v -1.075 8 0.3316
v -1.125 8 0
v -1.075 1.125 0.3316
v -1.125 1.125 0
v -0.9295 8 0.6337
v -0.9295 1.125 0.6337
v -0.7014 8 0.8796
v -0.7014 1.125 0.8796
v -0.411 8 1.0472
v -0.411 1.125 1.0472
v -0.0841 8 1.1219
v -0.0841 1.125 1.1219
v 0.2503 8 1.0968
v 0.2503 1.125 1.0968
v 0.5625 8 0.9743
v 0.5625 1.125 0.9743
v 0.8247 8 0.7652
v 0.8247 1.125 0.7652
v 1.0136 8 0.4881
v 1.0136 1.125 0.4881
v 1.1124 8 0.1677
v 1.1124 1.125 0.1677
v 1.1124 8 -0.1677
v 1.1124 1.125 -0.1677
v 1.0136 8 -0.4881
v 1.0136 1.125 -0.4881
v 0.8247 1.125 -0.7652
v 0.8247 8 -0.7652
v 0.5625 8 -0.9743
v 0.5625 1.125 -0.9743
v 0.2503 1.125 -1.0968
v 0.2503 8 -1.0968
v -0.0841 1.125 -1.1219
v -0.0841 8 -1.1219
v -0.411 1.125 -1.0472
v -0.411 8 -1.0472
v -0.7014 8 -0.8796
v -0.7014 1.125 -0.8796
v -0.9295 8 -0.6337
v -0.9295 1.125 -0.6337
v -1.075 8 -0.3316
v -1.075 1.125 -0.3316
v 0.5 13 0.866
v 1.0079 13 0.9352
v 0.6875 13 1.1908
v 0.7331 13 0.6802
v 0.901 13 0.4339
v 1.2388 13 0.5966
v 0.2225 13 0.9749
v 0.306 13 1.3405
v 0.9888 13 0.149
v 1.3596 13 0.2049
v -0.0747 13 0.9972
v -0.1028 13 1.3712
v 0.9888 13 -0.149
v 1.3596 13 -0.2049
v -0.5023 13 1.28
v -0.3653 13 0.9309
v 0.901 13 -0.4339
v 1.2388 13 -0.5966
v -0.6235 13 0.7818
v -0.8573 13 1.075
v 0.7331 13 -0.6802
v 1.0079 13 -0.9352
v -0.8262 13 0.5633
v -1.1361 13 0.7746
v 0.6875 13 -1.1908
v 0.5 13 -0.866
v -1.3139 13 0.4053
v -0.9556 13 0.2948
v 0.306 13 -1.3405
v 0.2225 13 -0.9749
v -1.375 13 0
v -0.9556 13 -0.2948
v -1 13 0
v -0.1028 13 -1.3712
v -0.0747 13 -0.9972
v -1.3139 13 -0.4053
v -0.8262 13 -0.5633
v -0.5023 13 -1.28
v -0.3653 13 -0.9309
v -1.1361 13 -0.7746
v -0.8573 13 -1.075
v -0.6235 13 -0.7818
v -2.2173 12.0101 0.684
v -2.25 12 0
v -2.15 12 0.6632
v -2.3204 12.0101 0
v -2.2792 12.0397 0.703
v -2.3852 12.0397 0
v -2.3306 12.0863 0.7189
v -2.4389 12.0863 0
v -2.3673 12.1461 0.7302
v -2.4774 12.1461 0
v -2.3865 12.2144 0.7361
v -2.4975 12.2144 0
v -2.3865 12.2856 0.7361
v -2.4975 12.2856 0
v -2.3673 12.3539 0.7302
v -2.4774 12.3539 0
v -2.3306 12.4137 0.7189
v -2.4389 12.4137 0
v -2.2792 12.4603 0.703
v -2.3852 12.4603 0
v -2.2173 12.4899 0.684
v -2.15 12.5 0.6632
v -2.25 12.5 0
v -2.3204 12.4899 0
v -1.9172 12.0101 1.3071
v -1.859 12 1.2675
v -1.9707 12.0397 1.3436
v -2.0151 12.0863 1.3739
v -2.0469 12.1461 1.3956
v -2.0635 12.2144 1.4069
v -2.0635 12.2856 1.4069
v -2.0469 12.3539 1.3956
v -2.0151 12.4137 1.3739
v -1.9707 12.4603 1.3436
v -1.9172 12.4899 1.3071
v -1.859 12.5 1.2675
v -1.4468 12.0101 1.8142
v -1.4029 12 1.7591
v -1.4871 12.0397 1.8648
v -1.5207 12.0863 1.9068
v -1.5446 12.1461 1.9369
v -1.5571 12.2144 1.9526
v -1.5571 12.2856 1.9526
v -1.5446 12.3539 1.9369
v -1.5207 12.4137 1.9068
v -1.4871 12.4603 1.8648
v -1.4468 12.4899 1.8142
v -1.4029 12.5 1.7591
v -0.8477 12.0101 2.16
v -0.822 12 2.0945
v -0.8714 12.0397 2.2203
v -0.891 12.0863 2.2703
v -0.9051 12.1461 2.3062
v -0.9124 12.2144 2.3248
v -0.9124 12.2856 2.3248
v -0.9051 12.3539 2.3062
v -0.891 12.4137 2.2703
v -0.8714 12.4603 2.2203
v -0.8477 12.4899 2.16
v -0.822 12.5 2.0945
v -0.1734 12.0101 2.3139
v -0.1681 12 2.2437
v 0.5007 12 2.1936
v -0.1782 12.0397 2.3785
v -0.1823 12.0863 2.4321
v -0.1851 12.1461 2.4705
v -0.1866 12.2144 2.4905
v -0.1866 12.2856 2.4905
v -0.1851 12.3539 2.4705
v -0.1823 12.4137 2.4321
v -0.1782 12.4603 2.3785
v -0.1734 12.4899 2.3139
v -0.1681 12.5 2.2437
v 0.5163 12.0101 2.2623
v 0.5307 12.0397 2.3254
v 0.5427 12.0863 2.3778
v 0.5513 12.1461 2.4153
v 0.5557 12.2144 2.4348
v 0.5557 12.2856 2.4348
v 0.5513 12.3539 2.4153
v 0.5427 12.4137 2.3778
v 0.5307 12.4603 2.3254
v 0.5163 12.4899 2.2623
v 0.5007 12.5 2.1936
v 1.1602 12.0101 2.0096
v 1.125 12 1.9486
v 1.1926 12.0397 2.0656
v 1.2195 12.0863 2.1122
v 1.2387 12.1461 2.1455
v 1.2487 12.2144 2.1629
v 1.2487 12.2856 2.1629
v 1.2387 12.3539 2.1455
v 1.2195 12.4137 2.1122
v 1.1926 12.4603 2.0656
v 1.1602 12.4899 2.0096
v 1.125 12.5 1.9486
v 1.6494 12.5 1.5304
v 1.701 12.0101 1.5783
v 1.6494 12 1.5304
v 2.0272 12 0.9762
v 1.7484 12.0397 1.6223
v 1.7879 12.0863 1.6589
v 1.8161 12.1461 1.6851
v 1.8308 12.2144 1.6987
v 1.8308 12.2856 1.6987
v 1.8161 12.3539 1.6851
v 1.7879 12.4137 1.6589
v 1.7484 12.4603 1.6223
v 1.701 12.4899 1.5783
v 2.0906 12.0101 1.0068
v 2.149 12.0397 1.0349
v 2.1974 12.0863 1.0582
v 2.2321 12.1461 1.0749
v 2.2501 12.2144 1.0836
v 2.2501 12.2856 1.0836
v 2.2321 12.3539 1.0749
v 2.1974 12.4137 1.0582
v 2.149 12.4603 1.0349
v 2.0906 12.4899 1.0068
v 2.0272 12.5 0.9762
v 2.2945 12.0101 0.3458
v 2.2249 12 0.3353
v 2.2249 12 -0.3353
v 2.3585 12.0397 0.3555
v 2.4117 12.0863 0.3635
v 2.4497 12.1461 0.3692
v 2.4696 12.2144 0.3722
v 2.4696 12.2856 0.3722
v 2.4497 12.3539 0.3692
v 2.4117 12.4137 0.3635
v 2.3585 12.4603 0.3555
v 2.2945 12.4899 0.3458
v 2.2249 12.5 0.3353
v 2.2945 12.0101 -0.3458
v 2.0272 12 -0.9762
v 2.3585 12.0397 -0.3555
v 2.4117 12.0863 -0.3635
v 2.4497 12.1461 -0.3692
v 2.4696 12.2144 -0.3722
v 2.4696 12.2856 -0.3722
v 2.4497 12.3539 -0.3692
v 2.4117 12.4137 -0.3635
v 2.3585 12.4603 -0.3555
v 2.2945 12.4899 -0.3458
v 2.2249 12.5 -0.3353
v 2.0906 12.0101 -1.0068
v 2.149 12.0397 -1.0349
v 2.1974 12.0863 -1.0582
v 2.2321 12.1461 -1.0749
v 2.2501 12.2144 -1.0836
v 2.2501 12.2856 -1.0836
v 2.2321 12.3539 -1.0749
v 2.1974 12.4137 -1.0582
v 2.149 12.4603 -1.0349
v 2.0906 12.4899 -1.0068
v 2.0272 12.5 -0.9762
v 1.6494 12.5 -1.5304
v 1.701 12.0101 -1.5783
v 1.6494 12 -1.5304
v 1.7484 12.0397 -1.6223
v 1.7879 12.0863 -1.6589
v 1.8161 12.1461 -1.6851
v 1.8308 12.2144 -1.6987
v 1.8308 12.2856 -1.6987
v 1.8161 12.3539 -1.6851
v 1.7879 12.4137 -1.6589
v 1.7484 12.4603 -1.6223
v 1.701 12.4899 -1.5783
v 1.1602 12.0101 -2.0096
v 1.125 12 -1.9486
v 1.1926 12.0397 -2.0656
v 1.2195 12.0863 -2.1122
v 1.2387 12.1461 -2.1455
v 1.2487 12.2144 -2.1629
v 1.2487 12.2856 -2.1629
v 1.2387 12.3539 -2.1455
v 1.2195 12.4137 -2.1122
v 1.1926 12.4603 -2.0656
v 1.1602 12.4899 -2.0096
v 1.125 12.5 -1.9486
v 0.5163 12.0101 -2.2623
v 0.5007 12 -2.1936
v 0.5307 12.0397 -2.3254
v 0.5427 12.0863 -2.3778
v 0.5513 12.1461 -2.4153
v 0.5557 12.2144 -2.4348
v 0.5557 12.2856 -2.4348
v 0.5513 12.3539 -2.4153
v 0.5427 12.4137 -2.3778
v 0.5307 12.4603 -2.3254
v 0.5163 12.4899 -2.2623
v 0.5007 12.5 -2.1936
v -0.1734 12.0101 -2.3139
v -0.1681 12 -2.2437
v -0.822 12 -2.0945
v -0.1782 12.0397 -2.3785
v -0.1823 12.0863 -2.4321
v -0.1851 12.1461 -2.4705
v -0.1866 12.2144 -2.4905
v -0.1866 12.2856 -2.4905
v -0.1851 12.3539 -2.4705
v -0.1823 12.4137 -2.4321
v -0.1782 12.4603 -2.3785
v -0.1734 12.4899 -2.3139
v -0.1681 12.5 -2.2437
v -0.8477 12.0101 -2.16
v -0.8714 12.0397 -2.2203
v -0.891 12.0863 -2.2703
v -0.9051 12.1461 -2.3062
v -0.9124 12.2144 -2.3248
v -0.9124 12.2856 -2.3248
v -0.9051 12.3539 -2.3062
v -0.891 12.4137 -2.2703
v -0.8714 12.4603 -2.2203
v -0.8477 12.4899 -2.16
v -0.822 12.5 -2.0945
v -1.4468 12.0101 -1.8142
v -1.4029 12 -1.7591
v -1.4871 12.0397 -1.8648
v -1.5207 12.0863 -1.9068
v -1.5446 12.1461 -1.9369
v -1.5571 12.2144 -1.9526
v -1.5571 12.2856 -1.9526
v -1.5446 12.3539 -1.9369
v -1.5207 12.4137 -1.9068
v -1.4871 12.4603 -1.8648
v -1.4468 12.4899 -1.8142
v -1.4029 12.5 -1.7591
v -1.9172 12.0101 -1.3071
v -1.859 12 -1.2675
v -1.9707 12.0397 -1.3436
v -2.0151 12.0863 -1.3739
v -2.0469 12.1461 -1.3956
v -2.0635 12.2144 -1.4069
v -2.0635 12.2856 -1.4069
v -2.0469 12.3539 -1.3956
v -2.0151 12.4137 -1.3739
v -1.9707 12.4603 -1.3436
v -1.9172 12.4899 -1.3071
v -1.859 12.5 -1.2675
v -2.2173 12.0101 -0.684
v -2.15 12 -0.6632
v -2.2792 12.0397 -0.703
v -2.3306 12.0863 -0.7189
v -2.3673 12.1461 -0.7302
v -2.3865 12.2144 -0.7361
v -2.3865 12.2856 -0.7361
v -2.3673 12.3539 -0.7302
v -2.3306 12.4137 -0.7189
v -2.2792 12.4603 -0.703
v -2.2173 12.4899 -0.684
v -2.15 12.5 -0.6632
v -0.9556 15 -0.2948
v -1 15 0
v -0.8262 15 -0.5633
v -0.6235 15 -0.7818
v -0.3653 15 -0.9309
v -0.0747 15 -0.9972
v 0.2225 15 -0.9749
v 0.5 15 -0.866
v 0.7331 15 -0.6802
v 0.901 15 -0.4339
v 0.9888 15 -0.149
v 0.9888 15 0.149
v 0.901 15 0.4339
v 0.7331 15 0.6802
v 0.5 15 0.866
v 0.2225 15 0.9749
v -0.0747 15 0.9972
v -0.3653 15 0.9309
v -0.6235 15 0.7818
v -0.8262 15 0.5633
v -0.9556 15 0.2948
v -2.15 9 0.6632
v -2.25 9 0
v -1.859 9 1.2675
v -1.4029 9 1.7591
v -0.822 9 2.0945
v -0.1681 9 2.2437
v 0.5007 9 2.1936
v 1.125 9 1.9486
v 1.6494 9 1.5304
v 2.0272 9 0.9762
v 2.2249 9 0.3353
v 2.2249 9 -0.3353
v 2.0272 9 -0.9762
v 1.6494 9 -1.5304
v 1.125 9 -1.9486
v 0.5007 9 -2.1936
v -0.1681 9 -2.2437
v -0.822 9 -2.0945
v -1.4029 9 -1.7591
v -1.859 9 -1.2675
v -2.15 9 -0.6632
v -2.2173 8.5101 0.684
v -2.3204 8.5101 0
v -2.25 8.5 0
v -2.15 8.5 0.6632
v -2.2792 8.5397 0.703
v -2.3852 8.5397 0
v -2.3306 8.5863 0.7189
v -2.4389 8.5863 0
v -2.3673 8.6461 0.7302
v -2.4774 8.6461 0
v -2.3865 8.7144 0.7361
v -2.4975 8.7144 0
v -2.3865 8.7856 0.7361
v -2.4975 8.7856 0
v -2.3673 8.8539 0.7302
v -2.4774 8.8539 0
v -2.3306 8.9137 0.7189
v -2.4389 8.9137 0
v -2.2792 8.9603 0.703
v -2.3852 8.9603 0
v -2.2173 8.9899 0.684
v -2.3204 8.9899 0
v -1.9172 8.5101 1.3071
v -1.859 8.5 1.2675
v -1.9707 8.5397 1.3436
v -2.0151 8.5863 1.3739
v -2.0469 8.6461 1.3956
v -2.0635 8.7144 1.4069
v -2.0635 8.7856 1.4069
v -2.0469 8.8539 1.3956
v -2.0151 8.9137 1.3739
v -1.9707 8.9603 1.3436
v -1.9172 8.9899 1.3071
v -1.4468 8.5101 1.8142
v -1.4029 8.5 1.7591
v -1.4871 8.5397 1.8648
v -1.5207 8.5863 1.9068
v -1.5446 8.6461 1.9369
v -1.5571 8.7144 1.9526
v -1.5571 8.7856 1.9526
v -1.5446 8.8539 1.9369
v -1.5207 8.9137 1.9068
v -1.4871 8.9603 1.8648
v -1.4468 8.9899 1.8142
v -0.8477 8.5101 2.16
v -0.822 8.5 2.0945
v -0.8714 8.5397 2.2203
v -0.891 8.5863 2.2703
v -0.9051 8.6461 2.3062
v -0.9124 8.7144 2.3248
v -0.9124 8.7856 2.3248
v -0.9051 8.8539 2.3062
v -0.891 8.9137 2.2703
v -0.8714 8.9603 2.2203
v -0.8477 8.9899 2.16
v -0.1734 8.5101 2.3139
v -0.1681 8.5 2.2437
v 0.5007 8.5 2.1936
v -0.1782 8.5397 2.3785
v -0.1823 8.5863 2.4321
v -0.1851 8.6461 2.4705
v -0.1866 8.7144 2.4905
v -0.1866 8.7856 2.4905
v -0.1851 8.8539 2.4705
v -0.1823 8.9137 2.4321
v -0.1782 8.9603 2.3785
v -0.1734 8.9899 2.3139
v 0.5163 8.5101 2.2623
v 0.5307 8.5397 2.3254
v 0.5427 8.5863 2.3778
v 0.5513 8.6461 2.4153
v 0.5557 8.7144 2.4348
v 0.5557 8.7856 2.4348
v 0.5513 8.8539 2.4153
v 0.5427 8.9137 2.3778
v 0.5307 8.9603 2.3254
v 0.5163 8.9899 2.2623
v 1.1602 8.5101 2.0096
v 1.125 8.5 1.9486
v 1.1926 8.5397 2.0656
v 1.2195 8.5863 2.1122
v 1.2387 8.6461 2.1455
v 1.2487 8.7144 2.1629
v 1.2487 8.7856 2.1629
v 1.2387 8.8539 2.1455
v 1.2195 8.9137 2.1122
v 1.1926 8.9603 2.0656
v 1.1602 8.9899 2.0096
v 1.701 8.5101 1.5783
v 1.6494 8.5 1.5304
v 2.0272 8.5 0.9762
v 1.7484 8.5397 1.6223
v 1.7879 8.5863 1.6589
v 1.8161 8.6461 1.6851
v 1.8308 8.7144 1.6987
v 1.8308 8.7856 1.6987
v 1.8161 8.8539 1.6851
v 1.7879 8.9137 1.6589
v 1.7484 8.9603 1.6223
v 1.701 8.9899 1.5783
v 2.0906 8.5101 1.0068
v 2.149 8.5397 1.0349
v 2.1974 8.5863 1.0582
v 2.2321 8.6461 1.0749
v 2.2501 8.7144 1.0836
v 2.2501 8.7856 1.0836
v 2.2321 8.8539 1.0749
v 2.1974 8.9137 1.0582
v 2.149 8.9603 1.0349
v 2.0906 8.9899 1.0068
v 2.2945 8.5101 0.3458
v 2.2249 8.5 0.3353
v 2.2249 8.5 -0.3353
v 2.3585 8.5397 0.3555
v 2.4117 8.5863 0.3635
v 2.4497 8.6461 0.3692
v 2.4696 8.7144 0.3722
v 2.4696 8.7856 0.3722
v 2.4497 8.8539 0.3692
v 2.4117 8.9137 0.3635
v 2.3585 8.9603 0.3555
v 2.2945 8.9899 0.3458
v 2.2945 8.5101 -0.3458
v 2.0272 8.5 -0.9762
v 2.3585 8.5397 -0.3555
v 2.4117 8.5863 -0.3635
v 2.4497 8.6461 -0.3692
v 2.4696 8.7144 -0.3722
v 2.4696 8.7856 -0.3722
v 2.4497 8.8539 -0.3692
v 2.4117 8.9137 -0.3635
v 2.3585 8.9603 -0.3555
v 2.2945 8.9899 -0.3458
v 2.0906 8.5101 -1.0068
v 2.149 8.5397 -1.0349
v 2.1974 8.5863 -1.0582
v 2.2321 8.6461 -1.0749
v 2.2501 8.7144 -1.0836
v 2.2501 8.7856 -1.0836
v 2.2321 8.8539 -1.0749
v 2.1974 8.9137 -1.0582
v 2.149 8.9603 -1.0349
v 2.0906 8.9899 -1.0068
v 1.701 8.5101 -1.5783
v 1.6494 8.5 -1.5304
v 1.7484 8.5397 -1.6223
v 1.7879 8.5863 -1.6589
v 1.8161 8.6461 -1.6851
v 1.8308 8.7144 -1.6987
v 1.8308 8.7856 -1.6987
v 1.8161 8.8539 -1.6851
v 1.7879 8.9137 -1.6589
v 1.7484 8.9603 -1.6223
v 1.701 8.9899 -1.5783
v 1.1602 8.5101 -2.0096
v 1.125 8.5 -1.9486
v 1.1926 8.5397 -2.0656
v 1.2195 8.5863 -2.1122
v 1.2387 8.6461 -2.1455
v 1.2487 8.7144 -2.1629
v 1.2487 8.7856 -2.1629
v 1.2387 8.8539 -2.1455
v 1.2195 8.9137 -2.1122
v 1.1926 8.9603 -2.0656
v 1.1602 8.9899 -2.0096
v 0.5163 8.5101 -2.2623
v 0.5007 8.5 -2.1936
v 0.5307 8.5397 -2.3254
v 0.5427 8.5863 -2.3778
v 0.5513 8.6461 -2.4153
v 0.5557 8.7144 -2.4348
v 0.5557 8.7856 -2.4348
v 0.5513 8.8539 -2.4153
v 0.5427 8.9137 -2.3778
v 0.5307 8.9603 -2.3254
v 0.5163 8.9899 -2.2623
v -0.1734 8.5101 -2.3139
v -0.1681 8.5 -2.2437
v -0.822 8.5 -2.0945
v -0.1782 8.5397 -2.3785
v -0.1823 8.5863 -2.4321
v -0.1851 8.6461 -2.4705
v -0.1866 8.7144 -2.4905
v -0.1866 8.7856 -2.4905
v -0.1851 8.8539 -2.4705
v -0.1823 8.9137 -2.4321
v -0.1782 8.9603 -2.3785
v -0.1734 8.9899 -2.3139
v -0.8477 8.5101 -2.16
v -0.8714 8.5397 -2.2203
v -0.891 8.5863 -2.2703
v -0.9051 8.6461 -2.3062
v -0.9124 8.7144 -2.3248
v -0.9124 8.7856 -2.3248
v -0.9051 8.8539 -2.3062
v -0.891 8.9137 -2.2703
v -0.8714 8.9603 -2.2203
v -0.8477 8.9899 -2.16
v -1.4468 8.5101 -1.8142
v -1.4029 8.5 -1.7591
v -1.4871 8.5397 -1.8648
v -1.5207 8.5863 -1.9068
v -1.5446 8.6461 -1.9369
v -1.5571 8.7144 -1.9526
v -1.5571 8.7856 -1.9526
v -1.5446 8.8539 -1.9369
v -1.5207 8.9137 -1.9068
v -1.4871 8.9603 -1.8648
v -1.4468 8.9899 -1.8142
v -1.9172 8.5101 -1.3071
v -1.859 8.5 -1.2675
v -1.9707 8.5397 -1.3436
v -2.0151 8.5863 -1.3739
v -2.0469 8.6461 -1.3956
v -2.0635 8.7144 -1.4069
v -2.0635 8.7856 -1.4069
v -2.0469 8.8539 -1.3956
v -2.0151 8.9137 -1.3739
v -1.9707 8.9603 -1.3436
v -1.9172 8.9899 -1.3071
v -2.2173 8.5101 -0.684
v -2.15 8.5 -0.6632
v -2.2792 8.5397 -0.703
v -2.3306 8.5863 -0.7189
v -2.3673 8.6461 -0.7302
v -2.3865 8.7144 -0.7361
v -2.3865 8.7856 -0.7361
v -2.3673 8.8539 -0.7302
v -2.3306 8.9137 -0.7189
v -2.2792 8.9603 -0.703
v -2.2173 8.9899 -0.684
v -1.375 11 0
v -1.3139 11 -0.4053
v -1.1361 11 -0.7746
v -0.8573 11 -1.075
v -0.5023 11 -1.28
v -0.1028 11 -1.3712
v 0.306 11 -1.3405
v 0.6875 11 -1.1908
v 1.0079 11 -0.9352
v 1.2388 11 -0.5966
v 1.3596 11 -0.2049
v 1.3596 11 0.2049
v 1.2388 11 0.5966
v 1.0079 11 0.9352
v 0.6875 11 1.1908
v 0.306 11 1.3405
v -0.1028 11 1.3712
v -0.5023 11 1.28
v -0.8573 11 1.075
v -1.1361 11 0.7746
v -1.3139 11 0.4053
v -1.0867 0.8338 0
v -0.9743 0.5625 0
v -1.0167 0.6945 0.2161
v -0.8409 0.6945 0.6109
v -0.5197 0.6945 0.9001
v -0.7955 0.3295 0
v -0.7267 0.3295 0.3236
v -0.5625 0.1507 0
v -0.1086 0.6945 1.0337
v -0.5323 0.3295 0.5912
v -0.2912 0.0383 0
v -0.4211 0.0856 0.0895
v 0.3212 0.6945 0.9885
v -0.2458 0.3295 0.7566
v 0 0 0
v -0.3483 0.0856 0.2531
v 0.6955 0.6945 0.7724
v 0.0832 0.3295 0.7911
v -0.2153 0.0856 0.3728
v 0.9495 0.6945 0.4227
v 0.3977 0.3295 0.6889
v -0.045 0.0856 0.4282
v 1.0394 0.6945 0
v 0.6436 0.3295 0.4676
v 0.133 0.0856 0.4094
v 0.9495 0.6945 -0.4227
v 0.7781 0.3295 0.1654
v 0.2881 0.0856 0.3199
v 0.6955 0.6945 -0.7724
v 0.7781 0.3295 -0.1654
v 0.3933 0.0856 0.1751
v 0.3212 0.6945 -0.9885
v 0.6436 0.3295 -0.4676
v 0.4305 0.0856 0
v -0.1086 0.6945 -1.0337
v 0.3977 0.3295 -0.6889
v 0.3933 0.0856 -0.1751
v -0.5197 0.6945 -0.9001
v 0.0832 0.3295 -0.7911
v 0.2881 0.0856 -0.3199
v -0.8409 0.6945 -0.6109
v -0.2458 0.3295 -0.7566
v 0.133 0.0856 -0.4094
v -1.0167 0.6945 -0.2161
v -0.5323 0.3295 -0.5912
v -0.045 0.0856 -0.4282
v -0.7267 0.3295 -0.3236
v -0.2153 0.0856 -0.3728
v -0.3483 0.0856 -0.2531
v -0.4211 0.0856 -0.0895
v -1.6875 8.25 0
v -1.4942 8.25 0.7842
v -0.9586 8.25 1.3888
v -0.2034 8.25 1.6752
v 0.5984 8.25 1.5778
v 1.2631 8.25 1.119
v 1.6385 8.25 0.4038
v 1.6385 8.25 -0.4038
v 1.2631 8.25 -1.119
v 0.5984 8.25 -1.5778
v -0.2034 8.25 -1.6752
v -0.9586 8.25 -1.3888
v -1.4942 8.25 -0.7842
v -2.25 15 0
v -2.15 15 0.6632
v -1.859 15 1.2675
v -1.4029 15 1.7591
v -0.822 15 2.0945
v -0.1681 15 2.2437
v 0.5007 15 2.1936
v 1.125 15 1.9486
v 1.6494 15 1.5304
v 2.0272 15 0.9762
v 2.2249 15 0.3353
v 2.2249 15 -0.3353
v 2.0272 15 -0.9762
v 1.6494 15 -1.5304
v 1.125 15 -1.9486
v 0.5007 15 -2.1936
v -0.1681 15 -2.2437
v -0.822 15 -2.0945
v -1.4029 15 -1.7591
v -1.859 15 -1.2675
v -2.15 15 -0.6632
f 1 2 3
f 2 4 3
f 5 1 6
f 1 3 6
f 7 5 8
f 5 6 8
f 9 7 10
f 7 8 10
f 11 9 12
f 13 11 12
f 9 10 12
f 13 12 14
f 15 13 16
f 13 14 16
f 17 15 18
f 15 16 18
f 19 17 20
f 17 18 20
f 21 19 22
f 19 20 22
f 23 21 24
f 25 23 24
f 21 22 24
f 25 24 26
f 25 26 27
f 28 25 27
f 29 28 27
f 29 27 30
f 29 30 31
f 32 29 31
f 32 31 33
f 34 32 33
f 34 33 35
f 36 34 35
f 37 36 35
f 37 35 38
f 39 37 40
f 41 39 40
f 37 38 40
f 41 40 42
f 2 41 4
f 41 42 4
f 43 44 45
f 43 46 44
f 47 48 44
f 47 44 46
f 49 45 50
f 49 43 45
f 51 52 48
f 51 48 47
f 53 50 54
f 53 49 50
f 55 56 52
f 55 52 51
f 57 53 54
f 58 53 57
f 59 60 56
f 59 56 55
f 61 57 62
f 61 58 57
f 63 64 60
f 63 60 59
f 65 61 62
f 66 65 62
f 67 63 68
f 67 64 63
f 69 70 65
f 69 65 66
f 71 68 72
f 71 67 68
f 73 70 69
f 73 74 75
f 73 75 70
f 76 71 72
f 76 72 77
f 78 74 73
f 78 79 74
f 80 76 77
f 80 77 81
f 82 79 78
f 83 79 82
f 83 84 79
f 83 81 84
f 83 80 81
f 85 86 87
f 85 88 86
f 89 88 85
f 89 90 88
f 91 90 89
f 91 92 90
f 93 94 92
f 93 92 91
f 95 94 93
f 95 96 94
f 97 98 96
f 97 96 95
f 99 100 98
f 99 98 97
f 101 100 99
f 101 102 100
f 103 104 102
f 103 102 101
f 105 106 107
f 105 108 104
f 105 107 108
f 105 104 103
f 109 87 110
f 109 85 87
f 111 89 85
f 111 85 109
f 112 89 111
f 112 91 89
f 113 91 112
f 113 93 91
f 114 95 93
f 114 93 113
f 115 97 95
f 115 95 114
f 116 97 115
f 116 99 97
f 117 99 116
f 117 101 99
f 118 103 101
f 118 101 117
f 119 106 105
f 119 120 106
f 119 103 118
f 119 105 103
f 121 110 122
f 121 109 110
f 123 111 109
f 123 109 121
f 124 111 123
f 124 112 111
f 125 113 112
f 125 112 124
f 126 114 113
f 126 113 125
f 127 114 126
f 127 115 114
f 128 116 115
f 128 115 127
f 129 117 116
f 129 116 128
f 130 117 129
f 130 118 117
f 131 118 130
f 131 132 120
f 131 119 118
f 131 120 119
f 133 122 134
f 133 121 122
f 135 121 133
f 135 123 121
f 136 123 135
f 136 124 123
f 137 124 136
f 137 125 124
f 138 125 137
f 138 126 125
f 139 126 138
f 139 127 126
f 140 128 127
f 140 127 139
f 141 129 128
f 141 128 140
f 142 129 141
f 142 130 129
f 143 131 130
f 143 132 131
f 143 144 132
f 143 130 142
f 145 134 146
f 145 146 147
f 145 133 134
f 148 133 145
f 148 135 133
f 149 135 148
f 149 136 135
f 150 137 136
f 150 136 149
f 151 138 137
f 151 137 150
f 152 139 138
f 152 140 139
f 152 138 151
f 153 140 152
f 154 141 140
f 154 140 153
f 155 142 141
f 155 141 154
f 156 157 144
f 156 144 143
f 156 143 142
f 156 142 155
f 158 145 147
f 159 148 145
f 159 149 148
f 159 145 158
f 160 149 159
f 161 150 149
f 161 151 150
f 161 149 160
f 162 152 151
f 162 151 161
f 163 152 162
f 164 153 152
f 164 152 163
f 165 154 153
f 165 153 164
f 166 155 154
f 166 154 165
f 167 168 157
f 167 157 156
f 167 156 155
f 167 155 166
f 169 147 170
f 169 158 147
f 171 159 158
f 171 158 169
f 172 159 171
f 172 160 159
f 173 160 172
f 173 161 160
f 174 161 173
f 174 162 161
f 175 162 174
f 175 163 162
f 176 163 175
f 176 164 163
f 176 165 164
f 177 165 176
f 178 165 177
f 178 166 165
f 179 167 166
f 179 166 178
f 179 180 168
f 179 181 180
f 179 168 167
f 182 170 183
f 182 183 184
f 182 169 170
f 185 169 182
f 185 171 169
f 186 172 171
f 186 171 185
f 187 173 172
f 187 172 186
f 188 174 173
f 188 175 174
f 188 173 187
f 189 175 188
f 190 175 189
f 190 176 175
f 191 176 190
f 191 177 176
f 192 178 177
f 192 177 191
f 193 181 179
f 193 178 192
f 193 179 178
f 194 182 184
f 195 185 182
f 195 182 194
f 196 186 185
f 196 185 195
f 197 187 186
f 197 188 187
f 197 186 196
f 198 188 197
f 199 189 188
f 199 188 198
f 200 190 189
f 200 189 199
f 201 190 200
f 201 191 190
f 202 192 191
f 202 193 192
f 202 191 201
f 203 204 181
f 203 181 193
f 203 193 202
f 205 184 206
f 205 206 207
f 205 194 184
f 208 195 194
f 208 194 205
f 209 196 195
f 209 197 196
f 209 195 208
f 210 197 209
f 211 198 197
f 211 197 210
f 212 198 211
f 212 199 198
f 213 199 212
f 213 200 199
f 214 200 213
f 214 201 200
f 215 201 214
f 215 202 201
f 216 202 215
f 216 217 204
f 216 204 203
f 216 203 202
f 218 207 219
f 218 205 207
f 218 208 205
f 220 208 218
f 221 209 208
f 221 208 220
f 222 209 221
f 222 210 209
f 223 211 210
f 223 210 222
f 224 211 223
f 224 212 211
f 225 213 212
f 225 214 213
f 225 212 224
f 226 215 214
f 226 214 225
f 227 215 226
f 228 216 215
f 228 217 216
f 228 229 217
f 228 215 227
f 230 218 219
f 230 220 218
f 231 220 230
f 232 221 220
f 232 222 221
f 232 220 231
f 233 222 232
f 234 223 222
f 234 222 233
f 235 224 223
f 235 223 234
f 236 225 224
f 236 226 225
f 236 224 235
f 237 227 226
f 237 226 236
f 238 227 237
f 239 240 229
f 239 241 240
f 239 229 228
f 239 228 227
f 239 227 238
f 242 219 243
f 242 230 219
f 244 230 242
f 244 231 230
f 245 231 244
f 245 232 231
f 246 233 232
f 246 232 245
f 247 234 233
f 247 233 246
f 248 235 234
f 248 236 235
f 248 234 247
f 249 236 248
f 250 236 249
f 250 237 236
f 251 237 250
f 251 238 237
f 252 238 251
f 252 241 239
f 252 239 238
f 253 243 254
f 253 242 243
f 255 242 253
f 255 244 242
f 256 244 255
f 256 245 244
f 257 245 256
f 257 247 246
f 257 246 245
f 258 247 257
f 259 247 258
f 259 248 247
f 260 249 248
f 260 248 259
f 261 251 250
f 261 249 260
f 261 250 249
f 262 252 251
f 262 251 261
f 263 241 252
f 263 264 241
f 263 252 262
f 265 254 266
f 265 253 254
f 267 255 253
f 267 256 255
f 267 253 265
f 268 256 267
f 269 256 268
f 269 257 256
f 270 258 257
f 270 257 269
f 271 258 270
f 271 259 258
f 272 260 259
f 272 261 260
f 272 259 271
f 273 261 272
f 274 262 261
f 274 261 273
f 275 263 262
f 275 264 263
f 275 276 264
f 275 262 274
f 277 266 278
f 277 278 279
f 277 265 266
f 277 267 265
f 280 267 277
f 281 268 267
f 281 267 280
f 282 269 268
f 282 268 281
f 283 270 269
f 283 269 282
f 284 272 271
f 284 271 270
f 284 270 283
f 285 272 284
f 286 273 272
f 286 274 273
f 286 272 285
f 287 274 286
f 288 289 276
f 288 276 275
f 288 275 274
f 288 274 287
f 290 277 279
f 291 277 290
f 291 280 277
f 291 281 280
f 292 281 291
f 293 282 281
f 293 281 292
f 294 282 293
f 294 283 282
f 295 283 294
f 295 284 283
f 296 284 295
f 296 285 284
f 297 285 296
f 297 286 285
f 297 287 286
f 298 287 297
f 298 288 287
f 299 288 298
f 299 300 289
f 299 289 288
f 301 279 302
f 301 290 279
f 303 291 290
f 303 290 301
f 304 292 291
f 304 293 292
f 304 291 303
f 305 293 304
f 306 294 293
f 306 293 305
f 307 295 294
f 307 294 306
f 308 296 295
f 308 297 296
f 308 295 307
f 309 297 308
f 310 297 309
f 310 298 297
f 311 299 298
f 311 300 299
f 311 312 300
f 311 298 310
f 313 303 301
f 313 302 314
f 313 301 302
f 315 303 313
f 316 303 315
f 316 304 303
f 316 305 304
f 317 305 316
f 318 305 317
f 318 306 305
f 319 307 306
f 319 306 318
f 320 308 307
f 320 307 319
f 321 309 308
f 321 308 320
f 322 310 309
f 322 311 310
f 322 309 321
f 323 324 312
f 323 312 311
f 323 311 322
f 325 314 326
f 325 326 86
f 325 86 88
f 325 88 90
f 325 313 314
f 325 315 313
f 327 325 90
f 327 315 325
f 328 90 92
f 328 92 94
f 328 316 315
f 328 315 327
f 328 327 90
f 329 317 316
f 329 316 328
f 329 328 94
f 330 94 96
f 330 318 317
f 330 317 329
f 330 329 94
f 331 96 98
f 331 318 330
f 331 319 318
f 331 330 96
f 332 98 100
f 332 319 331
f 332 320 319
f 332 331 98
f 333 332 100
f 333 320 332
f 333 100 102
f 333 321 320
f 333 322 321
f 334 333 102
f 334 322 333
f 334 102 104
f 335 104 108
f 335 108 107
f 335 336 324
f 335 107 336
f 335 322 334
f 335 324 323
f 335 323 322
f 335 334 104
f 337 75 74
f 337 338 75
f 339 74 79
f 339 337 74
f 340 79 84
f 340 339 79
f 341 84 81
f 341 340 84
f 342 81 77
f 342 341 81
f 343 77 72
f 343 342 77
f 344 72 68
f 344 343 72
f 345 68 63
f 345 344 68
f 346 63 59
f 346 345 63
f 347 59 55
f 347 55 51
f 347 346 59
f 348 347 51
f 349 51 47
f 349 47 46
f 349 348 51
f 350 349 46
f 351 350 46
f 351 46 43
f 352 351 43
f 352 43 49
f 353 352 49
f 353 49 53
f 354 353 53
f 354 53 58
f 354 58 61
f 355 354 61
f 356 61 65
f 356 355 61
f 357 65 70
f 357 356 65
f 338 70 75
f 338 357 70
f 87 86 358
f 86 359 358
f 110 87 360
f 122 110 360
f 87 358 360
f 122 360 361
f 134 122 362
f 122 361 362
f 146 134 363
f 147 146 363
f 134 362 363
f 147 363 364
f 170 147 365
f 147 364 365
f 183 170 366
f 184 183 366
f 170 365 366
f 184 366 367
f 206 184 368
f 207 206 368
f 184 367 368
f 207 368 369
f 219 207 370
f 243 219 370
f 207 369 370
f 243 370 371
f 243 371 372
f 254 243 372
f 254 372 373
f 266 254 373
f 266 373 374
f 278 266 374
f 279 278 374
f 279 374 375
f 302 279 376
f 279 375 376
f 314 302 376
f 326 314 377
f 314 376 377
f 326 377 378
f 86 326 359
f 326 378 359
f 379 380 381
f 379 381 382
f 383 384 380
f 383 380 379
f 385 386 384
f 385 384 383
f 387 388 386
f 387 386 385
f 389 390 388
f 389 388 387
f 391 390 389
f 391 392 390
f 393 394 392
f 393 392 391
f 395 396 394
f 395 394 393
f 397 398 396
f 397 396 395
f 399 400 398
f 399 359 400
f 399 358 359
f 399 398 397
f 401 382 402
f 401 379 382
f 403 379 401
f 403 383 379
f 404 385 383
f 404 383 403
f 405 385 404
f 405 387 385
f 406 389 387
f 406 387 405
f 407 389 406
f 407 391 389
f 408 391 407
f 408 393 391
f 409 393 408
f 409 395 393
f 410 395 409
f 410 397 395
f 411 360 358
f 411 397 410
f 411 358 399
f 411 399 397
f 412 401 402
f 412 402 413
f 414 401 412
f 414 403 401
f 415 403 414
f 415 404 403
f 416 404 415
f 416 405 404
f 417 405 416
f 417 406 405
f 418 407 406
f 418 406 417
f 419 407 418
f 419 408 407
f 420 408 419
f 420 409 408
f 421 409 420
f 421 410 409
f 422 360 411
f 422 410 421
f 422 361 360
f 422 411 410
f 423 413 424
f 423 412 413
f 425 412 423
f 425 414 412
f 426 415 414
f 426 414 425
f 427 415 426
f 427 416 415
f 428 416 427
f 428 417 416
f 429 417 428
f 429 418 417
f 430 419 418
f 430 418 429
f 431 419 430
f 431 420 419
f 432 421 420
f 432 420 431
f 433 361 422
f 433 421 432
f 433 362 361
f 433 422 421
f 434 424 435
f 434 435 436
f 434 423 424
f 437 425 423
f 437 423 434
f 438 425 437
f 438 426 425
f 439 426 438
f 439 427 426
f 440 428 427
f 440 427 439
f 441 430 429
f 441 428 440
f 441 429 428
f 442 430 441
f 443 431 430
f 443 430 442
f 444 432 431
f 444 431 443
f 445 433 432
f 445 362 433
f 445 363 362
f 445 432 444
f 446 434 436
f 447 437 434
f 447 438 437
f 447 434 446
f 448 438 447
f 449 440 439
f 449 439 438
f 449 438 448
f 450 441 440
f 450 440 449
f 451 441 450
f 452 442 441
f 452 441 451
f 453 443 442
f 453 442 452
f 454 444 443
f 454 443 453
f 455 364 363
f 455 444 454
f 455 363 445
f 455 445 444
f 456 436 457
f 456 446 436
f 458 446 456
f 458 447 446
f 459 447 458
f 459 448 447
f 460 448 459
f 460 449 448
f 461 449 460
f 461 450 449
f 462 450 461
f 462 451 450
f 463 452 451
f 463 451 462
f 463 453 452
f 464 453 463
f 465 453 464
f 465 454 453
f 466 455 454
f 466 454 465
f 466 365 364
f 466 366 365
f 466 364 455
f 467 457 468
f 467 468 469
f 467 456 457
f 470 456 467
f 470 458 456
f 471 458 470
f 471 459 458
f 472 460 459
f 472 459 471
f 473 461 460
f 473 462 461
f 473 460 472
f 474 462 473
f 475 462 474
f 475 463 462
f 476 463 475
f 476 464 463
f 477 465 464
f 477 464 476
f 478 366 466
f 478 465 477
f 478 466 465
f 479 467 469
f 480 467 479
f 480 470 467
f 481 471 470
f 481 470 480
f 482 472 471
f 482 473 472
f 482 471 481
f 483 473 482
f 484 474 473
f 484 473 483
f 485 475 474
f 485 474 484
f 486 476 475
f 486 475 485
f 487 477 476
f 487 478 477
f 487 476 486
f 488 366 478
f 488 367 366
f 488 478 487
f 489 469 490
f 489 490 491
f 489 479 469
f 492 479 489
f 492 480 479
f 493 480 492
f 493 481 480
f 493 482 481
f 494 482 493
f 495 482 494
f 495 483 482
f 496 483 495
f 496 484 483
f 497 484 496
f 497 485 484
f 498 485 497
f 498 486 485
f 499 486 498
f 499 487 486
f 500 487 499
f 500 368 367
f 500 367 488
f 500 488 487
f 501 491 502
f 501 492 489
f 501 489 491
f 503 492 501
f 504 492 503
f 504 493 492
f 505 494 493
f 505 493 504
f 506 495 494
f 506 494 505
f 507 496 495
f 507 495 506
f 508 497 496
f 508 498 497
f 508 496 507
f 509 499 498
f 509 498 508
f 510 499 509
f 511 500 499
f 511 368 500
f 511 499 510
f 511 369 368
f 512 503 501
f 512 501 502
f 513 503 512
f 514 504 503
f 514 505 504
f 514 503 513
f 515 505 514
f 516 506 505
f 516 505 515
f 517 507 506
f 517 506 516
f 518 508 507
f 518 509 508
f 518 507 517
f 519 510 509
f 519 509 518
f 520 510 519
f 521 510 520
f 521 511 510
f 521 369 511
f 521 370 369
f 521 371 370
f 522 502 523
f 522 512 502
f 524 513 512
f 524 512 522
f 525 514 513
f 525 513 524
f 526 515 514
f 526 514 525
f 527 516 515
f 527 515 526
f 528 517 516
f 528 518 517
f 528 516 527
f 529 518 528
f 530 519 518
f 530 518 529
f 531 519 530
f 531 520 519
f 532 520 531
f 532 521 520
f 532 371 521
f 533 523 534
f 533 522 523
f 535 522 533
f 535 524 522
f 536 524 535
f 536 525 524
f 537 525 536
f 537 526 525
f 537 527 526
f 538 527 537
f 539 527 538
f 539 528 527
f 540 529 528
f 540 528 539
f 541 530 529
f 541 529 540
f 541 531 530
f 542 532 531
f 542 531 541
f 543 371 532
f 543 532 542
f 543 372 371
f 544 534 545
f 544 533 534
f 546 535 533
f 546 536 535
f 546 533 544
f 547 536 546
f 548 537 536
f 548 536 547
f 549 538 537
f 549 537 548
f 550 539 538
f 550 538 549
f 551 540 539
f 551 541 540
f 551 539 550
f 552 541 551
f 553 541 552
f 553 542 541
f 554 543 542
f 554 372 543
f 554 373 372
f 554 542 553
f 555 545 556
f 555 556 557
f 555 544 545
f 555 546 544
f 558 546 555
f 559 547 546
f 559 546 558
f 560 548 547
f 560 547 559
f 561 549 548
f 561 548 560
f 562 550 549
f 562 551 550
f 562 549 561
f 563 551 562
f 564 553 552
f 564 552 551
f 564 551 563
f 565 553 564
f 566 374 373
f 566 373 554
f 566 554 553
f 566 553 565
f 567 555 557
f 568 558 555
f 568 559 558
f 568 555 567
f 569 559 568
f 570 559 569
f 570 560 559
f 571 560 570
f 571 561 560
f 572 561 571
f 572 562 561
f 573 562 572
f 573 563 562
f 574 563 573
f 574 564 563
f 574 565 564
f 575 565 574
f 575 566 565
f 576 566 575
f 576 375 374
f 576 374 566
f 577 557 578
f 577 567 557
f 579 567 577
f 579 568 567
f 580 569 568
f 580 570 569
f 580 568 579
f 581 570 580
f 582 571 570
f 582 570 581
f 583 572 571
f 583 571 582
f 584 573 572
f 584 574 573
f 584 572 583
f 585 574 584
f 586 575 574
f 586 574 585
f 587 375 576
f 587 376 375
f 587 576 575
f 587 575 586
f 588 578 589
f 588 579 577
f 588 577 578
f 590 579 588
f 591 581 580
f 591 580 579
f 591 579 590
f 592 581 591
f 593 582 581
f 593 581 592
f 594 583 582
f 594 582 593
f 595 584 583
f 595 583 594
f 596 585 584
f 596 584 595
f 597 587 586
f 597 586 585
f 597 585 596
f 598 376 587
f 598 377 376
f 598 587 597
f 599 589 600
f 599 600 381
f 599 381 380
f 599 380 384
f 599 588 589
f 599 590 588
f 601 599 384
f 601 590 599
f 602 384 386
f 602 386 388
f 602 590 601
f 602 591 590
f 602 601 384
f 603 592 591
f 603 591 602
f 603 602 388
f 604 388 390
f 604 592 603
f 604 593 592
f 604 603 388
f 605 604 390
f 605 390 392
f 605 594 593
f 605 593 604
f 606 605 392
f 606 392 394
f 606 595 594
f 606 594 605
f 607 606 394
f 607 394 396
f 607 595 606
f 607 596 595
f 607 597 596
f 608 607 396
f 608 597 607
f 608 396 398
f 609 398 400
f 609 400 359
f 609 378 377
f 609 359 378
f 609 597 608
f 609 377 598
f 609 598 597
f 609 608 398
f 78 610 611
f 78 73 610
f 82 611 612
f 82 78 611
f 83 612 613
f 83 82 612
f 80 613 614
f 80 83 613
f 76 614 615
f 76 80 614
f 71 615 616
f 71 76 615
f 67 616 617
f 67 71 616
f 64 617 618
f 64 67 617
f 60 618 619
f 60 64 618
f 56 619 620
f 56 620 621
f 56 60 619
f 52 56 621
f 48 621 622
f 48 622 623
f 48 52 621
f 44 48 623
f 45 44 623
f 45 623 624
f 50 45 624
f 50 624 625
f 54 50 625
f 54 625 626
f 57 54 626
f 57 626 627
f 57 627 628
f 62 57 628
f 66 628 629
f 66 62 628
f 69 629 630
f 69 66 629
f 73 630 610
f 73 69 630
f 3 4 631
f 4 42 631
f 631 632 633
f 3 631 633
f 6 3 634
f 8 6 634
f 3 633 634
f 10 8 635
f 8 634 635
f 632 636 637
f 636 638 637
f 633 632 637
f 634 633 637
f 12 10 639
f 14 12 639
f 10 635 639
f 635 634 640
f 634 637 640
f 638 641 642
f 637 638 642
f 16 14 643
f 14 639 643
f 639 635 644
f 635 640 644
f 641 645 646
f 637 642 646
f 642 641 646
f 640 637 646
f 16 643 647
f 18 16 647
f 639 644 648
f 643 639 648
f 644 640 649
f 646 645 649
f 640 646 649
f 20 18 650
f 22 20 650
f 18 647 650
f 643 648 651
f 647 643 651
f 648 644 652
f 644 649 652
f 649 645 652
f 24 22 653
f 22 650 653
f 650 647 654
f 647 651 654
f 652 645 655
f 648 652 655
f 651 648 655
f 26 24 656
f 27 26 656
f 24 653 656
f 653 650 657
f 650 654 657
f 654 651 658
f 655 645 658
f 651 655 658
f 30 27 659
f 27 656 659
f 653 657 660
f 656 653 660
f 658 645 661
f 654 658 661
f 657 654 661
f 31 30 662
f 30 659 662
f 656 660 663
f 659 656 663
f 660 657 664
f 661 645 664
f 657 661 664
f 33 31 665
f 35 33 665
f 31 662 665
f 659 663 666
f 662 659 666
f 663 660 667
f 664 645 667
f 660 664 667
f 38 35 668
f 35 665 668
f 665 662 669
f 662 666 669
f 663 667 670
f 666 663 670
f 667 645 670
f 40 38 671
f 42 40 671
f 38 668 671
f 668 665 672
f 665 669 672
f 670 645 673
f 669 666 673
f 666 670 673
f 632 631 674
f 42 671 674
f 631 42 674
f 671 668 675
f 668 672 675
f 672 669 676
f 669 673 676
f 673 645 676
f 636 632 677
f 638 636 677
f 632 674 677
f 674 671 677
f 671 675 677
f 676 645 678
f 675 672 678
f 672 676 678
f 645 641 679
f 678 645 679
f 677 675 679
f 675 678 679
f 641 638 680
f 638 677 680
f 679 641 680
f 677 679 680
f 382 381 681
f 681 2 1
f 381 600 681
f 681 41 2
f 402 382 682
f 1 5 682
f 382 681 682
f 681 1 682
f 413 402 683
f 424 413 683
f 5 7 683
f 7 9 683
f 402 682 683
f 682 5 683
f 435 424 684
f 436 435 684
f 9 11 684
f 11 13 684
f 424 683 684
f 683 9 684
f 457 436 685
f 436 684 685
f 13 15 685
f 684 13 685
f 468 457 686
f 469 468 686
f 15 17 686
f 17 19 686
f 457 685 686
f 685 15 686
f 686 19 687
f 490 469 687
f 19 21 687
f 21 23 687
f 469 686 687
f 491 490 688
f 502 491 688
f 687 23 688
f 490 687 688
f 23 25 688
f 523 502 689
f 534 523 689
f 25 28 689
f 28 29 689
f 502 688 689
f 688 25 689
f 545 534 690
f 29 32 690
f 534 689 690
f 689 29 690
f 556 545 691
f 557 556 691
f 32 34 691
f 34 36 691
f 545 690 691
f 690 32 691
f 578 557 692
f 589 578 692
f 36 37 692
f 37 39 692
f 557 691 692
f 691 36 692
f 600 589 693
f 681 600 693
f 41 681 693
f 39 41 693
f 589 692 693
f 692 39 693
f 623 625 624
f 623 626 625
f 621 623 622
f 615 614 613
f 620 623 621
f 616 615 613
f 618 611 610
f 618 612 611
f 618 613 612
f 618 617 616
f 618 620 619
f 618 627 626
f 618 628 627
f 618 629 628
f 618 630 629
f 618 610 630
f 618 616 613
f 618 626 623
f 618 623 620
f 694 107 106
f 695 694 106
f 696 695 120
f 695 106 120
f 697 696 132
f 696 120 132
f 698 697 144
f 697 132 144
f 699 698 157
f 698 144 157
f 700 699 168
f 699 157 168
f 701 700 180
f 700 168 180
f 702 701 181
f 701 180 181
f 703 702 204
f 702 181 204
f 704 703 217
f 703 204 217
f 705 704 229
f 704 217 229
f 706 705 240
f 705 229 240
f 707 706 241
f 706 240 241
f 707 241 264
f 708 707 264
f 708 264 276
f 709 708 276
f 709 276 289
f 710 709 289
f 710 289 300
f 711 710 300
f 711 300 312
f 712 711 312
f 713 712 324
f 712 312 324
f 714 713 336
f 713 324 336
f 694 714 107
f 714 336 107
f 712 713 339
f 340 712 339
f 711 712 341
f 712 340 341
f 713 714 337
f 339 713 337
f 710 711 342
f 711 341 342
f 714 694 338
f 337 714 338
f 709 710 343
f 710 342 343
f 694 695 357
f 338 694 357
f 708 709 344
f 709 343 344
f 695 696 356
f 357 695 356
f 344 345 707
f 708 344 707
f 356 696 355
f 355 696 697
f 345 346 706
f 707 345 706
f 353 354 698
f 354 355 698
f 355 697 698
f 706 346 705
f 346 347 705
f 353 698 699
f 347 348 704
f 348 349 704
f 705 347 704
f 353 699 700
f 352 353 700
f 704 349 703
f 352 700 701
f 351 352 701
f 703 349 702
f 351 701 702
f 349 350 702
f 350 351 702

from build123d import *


with BuildPart() as part:
    # Skizze1 → Rotation1 (revolve)
    with BuildSketch(Plane.XY):
        with BuildLine():
            Line((-2.25, 15), (-2.25, 8.5))
            Line((-2.25, 8.5), (-1.125, 8))
            Line((-1.125, 8), (-1.125, 1.125))
            ThreePointArc((-1.125, 1.125), (-0.795495129, 0.329504871), (0, 0))
            Line((0, 0), (0, 15))
            Line((0, 15), (-2.25, 15))
        make_face()
    revolve(axis=Axis((0, 0, 0), (0, 1, 0)))

    # Skizze2 → Schnitt-Rotation1 (revolve, cut)
    with BuildSketch(Plane.XY):
        Polygon((0, 15), (0, 11), (-1.375, 11), (-1.375, 13), (-1, 13), (-1, 15), align=None)
    revolve(axis=Axis((0, 15, 0), (0, -1, 0)), mode=Mode.SUBTRACT)

    # Skizze3 → Rotation2 (revolve)
    with BuildSketch(Plane.XY):
        with BuildLine():
            Line((-2.25, 12.5), (-2.25, 12))
            ThreePointArc((-2.25, 12), (-2.5, 12.25), (-2.25, 12.5))
        make_face()
        with BuildLine():
            Line((-2.25, 9), (-2.25, 8.5))
            ThreePointArc((-2.25, 8.5), (-2.5, 8.75), (-2.25, 9))
        make_face()
    revolve(axis=Axis((0, 0, 0), (0, 1, 0)))


solid = part.part
